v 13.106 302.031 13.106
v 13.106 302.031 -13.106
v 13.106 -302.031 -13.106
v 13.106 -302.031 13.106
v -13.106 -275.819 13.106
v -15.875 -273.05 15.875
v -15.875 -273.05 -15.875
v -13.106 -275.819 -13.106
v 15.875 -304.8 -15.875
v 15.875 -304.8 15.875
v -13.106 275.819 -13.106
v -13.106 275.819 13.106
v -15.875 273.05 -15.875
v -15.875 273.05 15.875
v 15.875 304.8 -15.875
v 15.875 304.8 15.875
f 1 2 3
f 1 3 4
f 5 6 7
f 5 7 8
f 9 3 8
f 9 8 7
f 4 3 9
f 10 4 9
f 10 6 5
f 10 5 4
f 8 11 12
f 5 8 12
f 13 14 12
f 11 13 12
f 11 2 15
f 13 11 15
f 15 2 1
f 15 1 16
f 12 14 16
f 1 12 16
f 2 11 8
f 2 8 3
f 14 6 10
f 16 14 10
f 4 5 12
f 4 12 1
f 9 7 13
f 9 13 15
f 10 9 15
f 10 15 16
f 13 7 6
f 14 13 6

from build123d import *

# Parameters (mm, degrees)
SKETCH_W       = 31.75
SKETCH_H       = 31.75
SKETCH_W_2     = 26.2128
SKETCH_H_2     = 26.2128
PAD_DEPTH      = 304.8
PAD_DEPTH_BACK = 304.8
POCKET_DEPTH   = 31.75


with BuildPart() as part:
    # Sketch → Pad (new body, two sides)
    with BuildSketch(Plane.XZ) as pad_sk:
        Rectangle(SKETCH_W, SKETCH_H)
        Rectangle(SKETCH_W_2, SKETCH_H_2, mode=Mode.SUBTRACT)
    extrude(amount=PAD_DEPTH)
    extrude(pad_sk.sketch, amount=-PAD_DEPTH_BACK)

    # Sketch001 → Pocket (cut)
    with BuildSketch(Plane(origin=(0, 0, 15.875), x_dir=(-1, 0, 0), z_dir=(0, 0, 1))):
        Polygon((-15.875, -304.8), (15.875, -304.8), (15.875, -273.05), align=None)
    pocket = extrude(amount=-POCKET_DEPTH, mode=Mode.SUBTRACT)

    # Mirrored: Pocket across Sketch001 H_Axis
    add(pocket.mirror(Plane(origin=(0, 0, 15.875), x_dir=(0, 0, 1), z_dir=(0, -1, 0))), mode=Mode.SUBTRACT)


solid = part.part
